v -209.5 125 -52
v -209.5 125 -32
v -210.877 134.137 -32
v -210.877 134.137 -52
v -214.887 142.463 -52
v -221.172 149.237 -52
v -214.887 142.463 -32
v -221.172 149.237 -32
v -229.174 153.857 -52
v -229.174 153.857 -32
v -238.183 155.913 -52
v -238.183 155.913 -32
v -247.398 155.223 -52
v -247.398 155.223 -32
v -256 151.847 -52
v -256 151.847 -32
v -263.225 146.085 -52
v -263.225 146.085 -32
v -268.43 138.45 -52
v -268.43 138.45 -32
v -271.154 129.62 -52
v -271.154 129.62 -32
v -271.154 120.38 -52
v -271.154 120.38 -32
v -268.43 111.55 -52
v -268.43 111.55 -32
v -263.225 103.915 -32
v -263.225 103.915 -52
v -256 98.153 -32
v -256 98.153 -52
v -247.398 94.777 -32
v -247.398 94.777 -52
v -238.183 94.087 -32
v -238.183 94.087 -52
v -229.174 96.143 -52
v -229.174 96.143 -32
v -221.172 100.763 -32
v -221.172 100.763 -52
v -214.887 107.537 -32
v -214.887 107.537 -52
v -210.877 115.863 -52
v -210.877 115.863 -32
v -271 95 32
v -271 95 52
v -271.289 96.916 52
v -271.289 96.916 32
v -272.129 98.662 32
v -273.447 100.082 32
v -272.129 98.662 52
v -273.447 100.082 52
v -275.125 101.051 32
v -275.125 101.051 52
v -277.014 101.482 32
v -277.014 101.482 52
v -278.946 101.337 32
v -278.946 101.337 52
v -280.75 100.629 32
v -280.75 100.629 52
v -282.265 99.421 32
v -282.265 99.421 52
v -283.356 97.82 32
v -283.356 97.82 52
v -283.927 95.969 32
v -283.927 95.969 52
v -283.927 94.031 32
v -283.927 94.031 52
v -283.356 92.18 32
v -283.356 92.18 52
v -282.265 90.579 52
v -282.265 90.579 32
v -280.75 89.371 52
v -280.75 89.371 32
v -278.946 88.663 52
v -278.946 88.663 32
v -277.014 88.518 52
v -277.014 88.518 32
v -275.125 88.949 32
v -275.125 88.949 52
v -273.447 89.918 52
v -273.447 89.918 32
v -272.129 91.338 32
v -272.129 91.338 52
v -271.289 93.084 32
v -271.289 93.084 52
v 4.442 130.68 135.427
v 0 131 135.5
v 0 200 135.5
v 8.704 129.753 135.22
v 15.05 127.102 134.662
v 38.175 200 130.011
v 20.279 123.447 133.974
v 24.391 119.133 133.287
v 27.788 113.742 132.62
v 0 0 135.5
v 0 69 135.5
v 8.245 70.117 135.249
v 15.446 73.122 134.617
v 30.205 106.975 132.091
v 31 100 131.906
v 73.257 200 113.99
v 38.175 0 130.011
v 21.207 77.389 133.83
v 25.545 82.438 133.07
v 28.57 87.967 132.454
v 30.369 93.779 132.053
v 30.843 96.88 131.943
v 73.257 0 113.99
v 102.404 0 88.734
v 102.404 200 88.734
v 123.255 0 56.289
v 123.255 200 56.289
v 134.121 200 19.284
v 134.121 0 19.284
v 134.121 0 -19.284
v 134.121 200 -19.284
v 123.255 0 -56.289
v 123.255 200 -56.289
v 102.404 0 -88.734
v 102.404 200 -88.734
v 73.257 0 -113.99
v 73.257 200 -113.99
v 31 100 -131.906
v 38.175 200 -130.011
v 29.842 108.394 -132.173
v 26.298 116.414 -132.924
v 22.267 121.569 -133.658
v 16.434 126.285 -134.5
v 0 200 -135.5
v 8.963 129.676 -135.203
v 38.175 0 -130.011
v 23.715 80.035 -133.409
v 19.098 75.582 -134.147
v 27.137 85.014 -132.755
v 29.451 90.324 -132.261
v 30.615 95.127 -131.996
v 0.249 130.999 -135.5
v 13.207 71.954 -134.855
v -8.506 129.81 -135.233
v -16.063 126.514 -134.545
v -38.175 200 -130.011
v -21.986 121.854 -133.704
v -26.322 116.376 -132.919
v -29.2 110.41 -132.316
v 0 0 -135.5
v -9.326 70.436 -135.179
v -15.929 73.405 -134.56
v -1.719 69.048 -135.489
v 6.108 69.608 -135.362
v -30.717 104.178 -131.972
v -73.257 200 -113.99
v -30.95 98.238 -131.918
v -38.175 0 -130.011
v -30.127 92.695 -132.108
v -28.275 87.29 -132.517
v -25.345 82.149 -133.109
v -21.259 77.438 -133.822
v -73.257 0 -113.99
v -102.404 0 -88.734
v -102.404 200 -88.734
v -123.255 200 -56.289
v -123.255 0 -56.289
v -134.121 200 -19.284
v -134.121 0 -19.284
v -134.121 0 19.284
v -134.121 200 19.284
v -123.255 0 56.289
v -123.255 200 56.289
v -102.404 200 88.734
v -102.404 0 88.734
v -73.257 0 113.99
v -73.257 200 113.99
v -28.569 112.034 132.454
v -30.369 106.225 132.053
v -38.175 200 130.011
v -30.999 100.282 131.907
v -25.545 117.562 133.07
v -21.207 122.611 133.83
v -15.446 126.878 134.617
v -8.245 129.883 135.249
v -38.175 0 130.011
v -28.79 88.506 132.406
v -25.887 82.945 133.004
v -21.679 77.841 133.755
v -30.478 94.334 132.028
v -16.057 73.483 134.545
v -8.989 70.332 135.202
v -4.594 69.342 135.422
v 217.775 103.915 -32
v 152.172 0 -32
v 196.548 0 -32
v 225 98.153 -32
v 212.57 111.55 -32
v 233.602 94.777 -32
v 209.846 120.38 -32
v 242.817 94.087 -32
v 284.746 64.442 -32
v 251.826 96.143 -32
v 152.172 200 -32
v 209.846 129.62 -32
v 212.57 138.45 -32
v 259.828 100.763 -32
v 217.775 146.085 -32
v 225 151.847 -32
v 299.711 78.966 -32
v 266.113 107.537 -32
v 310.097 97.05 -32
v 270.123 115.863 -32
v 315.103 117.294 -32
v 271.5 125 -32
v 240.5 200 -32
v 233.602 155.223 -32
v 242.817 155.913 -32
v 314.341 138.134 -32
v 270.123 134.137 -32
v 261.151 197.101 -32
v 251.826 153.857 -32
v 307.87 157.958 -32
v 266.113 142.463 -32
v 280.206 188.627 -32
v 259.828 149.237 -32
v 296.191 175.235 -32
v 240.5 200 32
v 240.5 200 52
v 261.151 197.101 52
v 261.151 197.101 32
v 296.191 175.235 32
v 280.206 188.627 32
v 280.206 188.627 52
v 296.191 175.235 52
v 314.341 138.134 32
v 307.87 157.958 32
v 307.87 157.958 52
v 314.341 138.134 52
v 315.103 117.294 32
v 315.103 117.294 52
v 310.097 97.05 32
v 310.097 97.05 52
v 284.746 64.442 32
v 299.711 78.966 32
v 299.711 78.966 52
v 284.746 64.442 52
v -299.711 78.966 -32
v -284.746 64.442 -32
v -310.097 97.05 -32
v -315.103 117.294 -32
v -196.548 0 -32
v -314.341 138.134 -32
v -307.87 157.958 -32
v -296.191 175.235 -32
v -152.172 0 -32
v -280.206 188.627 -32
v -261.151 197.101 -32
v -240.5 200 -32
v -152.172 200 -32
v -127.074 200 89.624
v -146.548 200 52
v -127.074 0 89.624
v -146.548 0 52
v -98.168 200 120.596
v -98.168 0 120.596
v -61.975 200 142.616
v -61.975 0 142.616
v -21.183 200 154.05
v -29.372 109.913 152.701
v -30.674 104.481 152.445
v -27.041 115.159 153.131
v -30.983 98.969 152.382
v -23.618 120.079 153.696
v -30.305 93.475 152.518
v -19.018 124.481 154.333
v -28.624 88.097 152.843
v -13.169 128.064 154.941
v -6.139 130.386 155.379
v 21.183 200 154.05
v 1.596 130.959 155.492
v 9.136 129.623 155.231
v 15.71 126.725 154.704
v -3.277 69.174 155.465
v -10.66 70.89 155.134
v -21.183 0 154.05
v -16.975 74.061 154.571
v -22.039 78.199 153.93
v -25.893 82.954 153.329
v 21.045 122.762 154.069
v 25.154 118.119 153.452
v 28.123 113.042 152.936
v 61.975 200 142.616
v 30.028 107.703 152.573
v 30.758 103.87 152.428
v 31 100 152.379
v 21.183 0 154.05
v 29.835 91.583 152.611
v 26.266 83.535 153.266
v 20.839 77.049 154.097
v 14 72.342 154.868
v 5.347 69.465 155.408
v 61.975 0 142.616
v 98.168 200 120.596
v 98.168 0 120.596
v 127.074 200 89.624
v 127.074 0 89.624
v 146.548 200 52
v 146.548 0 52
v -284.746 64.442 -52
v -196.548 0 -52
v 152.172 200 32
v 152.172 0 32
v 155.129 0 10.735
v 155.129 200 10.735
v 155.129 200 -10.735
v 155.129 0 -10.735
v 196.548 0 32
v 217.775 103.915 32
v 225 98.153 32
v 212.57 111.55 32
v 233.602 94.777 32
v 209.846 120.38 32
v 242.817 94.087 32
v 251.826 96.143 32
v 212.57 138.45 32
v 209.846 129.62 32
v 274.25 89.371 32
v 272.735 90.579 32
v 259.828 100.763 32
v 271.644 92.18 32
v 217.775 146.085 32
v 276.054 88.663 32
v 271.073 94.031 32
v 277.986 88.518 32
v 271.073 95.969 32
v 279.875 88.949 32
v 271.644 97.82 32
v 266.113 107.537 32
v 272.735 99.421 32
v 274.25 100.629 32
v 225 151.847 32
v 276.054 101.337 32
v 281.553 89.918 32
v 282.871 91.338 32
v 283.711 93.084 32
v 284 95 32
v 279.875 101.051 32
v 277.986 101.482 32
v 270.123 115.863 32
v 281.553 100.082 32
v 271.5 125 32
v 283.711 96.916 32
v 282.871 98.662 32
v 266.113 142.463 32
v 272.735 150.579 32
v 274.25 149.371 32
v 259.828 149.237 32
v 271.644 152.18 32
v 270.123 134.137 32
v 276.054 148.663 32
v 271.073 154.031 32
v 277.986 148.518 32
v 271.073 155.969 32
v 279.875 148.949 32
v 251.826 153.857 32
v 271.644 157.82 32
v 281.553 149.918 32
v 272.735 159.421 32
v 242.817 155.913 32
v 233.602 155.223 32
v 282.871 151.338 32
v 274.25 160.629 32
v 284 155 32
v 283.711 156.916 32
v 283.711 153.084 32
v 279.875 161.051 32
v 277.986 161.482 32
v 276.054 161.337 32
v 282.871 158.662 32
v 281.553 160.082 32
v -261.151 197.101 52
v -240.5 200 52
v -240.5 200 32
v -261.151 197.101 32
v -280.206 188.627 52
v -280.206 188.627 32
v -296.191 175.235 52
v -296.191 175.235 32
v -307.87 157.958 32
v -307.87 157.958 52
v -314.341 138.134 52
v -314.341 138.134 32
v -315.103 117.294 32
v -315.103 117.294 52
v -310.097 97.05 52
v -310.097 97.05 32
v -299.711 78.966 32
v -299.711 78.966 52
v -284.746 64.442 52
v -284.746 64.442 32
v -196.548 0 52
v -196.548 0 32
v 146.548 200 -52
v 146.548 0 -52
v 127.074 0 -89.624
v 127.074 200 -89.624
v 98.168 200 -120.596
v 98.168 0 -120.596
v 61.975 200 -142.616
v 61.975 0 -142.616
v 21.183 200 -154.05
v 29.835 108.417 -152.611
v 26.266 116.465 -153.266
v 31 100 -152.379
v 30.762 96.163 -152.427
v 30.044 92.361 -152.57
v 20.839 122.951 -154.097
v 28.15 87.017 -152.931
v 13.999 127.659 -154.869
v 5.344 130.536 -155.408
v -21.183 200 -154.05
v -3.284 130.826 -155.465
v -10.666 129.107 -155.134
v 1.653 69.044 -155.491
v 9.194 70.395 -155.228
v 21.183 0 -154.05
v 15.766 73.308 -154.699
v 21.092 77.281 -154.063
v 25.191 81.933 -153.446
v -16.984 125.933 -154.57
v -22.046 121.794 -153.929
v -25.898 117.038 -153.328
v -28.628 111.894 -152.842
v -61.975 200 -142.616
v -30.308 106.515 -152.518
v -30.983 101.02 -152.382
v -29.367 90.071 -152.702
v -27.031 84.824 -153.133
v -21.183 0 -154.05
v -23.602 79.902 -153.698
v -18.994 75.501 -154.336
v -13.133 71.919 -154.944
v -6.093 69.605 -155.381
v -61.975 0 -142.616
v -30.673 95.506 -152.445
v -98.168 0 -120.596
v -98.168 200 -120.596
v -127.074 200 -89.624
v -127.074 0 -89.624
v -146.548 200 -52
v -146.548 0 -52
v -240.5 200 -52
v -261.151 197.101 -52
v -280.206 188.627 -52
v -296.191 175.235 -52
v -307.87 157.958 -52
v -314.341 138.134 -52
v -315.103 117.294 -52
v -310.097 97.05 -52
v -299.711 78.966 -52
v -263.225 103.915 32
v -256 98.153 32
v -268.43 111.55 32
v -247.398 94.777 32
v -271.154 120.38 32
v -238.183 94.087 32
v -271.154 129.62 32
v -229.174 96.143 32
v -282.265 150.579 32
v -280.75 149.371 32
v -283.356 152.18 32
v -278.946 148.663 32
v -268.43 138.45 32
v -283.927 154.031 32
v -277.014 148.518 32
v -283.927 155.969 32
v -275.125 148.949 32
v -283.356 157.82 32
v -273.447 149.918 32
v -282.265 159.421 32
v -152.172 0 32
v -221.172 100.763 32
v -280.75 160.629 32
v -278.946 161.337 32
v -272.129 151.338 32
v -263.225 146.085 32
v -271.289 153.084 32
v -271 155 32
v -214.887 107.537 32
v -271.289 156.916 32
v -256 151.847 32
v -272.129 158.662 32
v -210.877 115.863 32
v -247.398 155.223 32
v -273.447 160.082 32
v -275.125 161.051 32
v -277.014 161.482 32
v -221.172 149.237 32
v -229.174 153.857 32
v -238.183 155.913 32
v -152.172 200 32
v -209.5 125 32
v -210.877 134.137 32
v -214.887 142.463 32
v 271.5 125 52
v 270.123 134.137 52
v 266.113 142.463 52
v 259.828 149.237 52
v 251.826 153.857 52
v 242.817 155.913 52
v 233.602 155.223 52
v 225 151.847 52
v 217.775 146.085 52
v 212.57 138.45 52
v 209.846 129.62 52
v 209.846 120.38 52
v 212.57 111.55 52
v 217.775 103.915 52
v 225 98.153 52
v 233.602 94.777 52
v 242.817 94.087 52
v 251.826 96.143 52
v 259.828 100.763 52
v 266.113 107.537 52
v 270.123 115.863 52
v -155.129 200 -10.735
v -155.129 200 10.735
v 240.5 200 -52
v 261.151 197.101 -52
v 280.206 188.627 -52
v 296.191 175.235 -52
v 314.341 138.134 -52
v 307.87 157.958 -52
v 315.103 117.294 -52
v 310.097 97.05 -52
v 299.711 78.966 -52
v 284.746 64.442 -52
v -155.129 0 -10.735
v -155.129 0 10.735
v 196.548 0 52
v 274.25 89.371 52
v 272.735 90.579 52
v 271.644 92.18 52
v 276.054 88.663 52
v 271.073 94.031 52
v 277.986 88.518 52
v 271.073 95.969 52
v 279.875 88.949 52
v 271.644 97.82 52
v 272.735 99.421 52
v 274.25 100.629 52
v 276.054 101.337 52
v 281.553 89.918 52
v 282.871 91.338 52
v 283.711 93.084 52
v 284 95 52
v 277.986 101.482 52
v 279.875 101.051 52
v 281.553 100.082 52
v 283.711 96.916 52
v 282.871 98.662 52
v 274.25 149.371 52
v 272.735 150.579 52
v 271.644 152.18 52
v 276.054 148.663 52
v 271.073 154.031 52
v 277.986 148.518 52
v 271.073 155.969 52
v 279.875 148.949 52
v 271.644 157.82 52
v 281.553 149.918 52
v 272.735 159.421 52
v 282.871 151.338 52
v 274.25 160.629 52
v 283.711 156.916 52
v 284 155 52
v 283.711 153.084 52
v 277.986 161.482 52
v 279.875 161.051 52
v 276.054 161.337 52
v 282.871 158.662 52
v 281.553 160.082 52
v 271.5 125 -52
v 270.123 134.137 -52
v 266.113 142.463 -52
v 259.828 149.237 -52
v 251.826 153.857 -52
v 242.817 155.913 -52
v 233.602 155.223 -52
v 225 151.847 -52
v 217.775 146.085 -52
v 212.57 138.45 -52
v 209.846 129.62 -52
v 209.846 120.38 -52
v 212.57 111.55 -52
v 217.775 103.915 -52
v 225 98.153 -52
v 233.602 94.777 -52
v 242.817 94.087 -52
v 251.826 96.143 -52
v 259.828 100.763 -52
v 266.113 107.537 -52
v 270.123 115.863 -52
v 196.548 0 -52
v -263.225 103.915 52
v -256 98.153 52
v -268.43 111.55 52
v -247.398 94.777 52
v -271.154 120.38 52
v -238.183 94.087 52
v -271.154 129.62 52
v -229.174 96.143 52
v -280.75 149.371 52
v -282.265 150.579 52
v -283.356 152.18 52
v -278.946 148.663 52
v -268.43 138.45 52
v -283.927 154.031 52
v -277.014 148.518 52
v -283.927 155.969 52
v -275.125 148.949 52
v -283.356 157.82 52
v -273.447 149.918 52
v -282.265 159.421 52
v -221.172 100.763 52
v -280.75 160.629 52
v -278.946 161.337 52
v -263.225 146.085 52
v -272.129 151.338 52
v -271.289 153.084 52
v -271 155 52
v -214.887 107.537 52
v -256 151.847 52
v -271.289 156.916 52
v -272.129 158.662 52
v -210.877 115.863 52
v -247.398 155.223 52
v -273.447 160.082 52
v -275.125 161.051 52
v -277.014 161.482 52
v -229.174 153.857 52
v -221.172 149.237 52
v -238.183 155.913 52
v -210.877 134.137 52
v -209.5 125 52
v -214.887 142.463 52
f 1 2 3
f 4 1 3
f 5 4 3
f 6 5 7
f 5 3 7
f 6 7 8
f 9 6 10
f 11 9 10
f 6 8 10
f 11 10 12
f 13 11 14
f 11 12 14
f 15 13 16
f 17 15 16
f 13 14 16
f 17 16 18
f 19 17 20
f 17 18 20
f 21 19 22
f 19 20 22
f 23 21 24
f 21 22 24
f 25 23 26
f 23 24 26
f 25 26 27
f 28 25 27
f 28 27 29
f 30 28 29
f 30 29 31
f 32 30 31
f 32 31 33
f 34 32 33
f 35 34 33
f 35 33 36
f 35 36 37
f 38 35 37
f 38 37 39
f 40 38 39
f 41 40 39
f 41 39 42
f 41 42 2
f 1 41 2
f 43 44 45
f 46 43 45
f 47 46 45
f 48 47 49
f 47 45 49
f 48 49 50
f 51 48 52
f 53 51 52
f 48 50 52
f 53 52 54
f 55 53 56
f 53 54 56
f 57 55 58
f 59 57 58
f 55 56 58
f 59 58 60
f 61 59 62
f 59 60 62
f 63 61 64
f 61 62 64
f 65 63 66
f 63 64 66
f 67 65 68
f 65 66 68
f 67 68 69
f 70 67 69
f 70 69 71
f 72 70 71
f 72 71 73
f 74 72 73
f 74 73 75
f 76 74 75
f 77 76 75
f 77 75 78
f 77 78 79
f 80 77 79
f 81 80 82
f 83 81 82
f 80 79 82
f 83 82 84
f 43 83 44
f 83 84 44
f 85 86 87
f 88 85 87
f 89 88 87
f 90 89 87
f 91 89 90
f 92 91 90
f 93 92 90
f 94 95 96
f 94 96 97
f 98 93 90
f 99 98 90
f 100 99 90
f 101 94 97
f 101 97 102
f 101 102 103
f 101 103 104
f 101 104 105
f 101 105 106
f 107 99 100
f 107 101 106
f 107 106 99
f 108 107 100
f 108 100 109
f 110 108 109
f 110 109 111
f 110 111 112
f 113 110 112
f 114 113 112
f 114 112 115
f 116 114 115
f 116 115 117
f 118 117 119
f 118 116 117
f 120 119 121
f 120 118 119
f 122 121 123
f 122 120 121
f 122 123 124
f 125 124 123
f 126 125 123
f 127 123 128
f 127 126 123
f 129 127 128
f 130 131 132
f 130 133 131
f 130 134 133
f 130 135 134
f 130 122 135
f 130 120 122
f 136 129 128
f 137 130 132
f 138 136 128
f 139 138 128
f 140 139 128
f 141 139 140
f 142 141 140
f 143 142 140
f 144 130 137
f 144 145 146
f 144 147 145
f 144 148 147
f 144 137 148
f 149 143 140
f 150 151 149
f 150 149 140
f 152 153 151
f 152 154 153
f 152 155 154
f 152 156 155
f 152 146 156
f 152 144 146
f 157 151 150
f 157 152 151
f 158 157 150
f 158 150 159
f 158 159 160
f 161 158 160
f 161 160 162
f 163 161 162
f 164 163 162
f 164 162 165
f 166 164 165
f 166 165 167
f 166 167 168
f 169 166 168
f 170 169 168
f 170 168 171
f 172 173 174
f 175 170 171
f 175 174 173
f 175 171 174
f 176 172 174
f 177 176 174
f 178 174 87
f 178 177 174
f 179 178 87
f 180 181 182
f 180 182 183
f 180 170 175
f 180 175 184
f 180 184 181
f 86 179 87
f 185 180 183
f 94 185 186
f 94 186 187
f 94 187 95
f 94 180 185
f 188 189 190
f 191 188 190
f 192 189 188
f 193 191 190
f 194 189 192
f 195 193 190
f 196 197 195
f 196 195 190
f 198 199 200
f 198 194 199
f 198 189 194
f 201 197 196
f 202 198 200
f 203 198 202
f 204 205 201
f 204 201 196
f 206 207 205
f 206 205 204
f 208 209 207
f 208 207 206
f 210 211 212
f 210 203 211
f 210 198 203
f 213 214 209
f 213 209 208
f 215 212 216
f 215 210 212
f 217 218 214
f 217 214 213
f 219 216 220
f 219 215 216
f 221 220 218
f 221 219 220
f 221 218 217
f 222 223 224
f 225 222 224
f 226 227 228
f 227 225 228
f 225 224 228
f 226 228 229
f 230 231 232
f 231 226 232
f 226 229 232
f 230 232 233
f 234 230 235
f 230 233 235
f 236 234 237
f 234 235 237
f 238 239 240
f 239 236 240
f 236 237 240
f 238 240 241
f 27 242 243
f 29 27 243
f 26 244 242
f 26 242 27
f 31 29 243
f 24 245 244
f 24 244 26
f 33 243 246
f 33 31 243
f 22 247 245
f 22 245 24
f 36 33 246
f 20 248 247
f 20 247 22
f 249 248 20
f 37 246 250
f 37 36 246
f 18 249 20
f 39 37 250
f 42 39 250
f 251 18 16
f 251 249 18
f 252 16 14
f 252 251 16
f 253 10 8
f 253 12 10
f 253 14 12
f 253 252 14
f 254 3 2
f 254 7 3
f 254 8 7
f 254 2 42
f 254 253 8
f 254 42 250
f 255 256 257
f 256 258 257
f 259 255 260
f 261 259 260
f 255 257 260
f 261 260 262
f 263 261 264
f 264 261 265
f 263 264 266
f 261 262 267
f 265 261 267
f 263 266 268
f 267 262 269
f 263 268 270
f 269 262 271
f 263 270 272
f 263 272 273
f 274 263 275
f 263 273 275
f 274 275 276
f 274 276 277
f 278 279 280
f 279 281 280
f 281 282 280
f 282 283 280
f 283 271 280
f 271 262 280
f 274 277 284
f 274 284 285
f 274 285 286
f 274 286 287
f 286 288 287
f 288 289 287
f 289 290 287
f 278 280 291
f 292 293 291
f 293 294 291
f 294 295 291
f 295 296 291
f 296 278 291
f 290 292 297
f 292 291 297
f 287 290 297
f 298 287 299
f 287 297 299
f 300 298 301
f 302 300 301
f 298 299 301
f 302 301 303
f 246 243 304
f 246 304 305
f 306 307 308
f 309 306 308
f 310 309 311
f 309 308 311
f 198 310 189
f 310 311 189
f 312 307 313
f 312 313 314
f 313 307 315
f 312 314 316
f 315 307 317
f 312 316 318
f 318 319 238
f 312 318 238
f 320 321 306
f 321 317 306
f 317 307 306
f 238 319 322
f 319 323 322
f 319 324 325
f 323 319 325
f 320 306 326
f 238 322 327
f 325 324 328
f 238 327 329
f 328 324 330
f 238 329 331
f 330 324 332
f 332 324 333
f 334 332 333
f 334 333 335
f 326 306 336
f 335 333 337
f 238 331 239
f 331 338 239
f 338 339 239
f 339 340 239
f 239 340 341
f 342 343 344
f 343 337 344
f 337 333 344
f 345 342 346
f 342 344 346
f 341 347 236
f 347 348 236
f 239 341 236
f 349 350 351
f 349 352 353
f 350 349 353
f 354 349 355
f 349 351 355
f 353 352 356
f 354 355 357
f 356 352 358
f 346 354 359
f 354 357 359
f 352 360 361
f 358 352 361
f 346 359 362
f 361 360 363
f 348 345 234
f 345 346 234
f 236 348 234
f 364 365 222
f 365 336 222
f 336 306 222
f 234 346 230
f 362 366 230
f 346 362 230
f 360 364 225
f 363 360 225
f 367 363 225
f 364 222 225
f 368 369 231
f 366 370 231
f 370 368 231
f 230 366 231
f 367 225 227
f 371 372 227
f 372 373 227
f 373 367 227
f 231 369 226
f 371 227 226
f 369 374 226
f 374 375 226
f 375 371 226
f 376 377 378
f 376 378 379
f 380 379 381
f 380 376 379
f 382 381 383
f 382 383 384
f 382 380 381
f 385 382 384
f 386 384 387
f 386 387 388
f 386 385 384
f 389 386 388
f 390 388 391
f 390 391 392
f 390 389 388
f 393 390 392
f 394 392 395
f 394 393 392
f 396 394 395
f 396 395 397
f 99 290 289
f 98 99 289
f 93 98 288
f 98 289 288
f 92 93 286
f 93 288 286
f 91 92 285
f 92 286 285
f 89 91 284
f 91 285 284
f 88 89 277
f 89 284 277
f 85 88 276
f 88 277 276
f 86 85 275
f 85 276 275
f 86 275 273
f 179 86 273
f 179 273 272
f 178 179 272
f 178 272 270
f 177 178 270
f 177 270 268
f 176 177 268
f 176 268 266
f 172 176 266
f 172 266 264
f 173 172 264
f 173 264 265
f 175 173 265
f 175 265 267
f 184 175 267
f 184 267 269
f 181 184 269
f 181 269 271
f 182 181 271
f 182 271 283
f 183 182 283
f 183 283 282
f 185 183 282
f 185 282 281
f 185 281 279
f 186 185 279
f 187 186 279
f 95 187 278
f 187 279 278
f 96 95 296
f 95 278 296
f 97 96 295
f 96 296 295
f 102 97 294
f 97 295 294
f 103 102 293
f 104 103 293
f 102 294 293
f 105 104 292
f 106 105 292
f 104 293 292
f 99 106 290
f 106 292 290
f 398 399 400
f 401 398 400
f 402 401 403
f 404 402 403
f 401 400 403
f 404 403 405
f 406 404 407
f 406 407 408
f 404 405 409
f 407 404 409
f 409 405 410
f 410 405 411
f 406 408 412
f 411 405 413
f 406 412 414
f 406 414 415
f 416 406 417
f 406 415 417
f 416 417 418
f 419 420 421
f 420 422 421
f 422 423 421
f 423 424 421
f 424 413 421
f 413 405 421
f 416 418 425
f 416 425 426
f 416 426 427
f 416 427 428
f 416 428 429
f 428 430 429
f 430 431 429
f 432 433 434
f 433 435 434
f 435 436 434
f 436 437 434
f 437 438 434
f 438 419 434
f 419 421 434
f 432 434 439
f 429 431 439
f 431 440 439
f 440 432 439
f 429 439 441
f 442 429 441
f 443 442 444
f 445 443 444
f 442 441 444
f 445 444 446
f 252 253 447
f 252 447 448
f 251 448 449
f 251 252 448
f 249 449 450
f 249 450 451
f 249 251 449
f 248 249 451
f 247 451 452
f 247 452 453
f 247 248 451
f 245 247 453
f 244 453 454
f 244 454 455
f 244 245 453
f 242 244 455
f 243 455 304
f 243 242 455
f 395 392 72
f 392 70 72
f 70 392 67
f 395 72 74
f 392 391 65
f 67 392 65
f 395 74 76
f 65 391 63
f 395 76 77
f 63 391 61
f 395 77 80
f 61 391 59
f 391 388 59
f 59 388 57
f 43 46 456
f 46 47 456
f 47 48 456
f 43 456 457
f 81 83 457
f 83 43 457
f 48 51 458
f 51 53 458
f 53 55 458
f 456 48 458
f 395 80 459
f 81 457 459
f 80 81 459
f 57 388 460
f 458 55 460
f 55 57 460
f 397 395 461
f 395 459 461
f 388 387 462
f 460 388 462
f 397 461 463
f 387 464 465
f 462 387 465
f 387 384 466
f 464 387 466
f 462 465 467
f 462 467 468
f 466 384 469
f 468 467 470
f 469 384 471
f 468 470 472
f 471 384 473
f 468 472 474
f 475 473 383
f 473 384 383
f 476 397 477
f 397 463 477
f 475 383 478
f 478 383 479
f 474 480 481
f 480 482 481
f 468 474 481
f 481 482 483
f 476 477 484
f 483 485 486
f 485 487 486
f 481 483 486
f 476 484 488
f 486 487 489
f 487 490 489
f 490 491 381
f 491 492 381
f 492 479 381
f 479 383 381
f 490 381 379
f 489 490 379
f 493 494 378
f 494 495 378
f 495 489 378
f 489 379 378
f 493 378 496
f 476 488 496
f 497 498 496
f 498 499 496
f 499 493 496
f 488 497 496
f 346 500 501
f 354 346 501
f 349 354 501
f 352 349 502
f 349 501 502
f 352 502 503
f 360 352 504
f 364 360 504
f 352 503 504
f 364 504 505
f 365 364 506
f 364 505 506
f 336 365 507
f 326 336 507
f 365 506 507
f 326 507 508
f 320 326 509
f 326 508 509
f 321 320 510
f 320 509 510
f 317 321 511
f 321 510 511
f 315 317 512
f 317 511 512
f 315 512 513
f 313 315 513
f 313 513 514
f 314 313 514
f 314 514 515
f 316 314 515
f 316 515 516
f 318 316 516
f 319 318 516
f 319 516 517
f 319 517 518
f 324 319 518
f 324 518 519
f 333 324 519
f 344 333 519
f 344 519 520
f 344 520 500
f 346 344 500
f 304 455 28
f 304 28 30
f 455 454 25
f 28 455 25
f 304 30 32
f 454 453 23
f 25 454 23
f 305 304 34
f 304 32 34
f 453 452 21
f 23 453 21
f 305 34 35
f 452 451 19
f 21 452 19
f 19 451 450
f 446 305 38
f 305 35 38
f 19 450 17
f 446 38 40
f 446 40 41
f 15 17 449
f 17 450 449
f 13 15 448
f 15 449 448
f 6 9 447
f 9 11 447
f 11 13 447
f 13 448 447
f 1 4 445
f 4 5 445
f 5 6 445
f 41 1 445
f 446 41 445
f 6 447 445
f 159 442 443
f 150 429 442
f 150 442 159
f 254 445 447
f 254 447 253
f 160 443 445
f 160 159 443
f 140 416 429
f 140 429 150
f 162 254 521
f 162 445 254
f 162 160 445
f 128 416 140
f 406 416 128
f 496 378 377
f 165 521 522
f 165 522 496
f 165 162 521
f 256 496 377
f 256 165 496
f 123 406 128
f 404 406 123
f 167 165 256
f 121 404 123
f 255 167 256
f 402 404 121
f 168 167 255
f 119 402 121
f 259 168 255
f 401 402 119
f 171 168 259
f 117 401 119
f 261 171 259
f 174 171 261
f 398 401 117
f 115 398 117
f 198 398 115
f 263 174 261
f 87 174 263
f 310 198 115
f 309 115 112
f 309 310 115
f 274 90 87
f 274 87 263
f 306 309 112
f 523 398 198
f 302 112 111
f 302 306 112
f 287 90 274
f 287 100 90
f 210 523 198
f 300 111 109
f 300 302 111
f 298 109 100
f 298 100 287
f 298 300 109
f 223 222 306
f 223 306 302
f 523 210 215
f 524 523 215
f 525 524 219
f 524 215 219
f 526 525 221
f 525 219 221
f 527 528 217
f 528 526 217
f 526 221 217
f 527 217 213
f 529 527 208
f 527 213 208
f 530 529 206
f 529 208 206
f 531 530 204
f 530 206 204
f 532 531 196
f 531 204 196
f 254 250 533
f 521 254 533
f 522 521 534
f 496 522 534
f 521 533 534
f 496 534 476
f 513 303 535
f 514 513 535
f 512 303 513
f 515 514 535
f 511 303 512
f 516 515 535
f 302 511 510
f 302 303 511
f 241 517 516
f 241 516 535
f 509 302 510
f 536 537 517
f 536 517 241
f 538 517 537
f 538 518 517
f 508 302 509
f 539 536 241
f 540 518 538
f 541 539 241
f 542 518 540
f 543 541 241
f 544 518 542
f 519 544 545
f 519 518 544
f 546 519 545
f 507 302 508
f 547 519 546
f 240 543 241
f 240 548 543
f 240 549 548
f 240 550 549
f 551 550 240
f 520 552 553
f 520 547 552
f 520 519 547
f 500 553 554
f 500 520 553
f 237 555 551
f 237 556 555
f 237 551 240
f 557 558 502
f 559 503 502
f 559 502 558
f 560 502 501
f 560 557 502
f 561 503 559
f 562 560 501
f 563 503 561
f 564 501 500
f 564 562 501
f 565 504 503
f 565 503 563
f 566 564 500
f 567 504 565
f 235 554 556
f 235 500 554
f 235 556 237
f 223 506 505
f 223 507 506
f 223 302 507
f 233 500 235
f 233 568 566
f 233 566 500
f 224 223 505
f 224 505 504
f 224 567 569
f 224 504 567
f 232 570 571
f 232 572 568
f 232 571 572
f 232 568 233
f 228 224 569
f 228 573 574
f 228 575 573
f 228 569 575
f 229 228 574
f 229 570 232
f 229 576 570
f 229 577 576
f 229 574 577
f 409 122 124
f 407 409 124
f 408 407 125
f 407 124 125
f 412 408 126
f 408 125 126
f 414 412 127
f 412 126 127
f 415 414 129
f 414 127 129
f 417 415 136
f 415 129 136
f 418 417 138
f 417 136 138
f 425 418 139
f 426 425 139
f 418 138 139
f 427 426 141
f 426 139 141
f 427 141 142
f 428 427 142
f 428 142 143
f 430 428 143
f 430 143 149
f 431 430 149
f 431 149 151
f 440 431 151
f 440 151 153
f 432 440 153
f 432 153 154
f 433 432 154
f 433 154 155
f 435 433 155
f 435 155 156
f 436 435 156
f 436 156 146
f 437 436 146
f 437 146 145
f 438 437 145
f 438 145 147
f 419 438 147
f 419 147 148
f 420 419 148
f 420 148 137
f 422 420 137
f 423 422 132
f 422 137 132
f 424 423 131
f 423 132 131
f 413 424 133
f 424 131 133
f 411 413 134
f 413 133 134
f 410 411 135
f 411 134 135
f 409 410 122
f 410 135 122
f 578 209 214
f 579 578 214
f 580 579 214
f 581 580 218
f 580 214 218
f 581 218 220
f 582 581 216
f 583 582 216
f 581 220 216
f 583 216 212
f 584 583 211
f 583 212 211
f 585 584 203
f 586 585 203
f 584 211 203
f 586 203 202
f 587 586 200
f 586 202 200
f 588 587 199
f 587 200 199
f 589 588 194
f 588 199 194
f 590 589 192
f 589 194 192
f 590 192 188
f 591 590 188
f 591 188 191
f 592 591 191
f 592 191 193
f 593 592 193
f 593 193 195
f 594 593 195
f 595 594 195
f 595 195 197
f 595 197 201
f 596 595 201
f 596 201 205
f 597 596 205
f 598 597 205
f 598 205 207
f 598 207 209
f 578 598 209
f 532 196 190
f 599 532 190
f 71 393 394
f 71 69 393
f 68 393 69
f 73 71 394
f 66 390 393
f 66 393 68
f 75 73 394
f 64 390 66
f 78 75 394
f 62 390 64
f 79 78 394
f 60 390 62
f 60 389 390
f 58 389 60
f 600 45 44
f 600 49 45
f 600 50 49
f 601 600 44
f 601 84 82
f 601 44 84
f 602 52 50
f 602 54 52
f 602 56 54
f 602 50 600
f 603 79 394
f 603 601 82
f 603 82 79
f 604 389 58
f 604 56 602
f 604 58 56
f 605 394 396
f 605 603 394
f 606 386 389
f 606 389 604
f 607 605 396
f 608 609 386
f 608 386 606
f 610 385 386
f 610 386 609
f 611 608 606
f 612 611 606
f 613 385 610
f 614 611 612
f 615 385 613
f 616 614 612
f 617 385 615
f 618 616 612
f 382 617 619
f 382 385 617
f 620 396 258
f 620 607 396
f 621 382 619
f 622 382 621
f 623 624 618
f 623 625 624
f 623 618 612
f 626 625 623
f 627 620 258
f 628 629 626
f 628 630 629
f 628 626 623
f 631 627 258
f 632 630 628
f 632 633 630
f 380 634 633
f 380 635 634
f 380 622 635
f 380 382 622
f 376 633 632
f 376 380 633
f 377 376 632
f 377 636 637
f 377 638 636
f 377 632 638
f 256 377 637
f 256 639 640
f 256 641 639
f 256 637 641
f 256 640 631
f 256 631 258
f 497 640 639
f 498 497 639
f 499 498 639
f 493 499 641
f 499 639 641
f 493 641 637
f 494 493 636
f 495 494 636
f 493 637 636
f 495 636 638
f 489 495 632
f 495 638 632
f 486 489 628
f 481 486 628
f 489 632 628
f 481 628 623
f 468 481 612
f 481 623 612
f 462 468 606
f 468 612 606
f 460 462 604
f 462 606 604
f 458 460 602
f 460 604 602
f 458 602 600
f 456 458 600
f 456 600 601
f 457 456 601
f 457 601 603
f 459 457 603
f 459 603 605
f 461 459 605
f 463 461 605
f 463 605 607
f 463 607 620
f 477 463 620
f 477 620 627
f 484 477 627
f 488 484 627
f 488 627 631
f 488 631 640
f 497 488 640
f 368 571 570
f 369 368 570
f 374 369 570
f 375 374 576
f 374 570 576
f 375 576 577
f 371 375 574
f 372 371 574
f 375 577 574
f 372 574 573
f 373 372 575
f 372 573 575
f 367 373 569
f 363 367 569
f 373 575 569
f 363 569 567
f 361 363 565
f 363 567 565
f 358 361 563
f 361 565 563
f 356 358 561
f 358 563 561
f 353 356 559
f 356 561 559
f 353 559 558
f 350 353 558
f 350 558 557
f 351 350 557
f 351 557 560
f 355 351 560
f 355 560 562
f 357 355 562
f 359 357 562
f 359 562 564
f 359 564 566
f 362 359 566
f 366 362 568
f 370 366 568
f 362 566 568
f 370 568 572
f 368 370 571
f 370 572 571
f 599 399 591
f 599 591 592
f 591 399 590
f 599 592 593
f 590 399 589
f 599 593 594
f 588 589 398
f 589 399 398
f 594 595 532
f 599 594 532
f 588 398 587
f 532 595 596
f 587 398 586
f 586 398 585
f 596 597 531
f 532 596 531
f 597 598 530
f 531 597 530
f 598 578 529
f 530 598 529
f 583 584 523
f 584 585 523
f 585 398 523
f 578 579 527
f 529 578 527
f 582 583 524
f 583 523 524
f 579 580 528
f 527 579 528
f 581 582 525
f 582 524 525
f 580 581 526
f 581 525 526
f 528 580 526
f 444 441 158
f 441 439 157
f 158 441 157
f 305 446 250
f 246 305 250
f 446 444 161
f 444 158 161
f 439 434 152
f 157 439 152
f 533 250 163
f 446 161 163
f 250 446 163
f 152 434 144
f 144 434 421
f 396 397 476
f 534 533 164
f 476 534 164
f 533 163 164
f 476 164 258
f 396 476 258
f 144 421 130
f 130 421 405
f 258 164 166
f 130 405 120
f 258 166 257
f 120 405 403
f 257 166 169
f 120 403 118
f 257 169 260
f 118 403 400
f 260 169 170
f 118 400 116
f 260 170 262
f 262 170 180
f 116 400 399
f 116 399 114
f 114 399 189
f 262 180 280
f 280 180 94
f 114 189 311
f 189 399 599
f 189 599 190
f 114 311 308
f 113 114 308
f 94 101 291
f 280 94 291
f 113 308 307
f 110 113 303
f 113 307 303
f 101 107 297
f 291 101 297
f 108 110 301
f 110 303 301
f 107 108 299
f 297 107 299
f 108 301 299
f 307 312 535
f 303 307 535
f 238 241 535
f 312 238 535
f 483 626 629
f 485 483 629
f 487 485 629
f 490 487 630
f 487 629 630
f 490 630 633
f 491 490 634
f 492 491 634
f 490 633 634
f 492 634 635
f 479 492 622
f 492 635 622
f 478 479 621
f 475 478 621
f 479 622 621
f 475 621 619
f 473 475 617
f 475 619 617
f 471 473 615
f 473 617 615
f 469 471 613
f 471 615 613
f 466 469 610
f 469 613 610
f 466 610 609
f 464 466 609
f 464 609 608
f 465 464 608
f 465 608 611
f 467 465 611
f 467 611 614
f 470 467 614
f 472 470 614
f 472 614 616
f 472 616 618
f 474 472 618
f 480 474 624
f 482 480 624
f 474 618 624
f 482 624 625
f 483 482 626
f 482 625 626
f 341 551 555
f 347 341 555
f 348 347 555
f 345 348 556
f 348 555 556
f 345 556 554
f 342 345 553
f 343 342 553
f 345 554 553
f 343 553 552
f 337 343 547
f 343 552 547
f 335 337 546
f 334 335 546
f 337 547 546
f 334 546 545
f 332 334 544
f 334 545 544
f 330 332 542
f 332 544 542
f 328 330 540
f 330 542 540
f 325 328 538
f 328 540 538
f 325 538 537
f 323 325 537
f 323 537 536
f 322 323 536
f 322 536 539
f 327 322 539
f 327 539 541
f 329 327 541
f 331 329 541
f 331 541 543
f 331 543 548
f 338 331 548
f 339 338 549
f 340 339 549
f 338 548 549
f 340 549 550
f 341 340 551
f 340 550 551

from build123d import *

# Parameters (mm, degrees)
SKETCH_1_R          = 155.5
SKETCH_1_R_2        = 135.5
EXTRUDE_1_DEPTH     = 200
SKETCH_2_R          = 31
CUT_EXTRUDE_1_DEPTH = 703.75209
SKETCH_3_W          = 200
SKETCH_3_H          = 20
EXTRUDE_2_DEPTH     = 200
SKETCH_4_R          = 31
CUT_EXTRUDE_2_DEPTH = 451.72342916
SKETCH_5_R          = 6.5
CUT_EXTRUDE_3_DEPTH = 20


with BuildPart() as part:
    # 草图1 → 凸台-拉伸1 (new body)
    with BuildSketch(Plane(origin=(0, 0, 0), x_dir=(1, 0, 0), z_dir=(0, 1, 0))):
        with Locations(Location((0, 0, 0), (0, 0, 270))):
            Circle(SKETCH_1_R)
        with Locations(Location((0, 0, 0), (0, 0, 270))):
            Circle(SKETCH_1_R_2, mode=Mode.SUBTRACT)
    extrude(amount=EXTRUDE_1_DEPTH)

    # 草图2 → 切除-拉伸1 (cut, through all)
    with BuildSketch(Plane.XY.offset(500)):
        with Locations((0, 100)):
            Circle(SKETCH_2_R)
    extrude(amount=-CUT_EXTRUDE_1_DEPTH, mode=Mode.SUBTRACT)

    # 草图3 → 凸台-拉伸2 (add)
    with BuildSketch(Plane(origin=(0, 200, 0), x_dir=(1, 0, 0), z_dir=(0, 1, 0))):
        with Locations((246.54777378, 42)):
            Rectangle(SKETCH_3_W, SKETCH_3_H)
        with Locations((246.54777378, -42)):
            Rectangle(SKETCH_3_W, SKETCH_3_H)
        with Locations((-246.54777378, 42)):
            Rectangle(SKETCH_3_W, SKETCH_3_H)
        with Locations((-246.54777378, -42)):
            Rectangle(SKETCH_3_W, SKETCH_3_H)
    extrude(amount=-EXTRUDE_2_DEPTH)

    # 草图4 → 切除-拉伸2 (cut, through all)
    with BuildSketch(Plane.XY.offset(52)):
        with Locations((-240.5, 125)):
            Circle(SKETCH_4_R)
        with Locations((240.5, 125)):
            Circle(SKETCH_4_R)
        with BuildLine():
            Line((284.746447685, 64.442160976), (196.54777378, 0))
            Line((196.54777378, 0), (346.54777378, 0))
            Line((346.54777378, 0), (346.54777378, 200))
            Line((346.54777378, 200), (240.5, 200))
            ThreePointArc((240.5, 200), (311.798099297, 148.271893704), (284.746447685, 64.442160976))
        make_face()
        with BuildLine():
            Line((-284.746447685, 64.442160976), (-196.54777378, 0))
            Line((-196.54777378, 0), (-346.54777378, 0))
            Line((-346.54777378, 0), (-346.54777378, 200))
            Line((-346.54777378, 200), (-240.5, 200))
            ThreePointArc((-240.5, 200), (-311.798099297, 148.271893704), (-284.746447685, 64.442160976))
        make_face()
    extrude(amount=-CUT_EXTRUDE_2_DEPTH, mode=Mode.SUBTRACT)

    # 草图5 → 切除-拉伸3 (cut)
    with BuildSketch(Plane.XY.offset(52)):
        with Locations((277.5, 155)):
            Circle(SKETCH_5_R)
        with Locations((277.5, 95)):
            Circle(SKETCH_5_R)
        with Locations((-277.5, 155)):
            Circle(SKETCH_5_R)
        with Locations((-277.5, 95)):
            Circle(SKETCH_5_R)
    extrude(amount=-CUT_EXTRUDE_3_DEPTH, mode=Mode.SUBTRACT)


solid = part.part
